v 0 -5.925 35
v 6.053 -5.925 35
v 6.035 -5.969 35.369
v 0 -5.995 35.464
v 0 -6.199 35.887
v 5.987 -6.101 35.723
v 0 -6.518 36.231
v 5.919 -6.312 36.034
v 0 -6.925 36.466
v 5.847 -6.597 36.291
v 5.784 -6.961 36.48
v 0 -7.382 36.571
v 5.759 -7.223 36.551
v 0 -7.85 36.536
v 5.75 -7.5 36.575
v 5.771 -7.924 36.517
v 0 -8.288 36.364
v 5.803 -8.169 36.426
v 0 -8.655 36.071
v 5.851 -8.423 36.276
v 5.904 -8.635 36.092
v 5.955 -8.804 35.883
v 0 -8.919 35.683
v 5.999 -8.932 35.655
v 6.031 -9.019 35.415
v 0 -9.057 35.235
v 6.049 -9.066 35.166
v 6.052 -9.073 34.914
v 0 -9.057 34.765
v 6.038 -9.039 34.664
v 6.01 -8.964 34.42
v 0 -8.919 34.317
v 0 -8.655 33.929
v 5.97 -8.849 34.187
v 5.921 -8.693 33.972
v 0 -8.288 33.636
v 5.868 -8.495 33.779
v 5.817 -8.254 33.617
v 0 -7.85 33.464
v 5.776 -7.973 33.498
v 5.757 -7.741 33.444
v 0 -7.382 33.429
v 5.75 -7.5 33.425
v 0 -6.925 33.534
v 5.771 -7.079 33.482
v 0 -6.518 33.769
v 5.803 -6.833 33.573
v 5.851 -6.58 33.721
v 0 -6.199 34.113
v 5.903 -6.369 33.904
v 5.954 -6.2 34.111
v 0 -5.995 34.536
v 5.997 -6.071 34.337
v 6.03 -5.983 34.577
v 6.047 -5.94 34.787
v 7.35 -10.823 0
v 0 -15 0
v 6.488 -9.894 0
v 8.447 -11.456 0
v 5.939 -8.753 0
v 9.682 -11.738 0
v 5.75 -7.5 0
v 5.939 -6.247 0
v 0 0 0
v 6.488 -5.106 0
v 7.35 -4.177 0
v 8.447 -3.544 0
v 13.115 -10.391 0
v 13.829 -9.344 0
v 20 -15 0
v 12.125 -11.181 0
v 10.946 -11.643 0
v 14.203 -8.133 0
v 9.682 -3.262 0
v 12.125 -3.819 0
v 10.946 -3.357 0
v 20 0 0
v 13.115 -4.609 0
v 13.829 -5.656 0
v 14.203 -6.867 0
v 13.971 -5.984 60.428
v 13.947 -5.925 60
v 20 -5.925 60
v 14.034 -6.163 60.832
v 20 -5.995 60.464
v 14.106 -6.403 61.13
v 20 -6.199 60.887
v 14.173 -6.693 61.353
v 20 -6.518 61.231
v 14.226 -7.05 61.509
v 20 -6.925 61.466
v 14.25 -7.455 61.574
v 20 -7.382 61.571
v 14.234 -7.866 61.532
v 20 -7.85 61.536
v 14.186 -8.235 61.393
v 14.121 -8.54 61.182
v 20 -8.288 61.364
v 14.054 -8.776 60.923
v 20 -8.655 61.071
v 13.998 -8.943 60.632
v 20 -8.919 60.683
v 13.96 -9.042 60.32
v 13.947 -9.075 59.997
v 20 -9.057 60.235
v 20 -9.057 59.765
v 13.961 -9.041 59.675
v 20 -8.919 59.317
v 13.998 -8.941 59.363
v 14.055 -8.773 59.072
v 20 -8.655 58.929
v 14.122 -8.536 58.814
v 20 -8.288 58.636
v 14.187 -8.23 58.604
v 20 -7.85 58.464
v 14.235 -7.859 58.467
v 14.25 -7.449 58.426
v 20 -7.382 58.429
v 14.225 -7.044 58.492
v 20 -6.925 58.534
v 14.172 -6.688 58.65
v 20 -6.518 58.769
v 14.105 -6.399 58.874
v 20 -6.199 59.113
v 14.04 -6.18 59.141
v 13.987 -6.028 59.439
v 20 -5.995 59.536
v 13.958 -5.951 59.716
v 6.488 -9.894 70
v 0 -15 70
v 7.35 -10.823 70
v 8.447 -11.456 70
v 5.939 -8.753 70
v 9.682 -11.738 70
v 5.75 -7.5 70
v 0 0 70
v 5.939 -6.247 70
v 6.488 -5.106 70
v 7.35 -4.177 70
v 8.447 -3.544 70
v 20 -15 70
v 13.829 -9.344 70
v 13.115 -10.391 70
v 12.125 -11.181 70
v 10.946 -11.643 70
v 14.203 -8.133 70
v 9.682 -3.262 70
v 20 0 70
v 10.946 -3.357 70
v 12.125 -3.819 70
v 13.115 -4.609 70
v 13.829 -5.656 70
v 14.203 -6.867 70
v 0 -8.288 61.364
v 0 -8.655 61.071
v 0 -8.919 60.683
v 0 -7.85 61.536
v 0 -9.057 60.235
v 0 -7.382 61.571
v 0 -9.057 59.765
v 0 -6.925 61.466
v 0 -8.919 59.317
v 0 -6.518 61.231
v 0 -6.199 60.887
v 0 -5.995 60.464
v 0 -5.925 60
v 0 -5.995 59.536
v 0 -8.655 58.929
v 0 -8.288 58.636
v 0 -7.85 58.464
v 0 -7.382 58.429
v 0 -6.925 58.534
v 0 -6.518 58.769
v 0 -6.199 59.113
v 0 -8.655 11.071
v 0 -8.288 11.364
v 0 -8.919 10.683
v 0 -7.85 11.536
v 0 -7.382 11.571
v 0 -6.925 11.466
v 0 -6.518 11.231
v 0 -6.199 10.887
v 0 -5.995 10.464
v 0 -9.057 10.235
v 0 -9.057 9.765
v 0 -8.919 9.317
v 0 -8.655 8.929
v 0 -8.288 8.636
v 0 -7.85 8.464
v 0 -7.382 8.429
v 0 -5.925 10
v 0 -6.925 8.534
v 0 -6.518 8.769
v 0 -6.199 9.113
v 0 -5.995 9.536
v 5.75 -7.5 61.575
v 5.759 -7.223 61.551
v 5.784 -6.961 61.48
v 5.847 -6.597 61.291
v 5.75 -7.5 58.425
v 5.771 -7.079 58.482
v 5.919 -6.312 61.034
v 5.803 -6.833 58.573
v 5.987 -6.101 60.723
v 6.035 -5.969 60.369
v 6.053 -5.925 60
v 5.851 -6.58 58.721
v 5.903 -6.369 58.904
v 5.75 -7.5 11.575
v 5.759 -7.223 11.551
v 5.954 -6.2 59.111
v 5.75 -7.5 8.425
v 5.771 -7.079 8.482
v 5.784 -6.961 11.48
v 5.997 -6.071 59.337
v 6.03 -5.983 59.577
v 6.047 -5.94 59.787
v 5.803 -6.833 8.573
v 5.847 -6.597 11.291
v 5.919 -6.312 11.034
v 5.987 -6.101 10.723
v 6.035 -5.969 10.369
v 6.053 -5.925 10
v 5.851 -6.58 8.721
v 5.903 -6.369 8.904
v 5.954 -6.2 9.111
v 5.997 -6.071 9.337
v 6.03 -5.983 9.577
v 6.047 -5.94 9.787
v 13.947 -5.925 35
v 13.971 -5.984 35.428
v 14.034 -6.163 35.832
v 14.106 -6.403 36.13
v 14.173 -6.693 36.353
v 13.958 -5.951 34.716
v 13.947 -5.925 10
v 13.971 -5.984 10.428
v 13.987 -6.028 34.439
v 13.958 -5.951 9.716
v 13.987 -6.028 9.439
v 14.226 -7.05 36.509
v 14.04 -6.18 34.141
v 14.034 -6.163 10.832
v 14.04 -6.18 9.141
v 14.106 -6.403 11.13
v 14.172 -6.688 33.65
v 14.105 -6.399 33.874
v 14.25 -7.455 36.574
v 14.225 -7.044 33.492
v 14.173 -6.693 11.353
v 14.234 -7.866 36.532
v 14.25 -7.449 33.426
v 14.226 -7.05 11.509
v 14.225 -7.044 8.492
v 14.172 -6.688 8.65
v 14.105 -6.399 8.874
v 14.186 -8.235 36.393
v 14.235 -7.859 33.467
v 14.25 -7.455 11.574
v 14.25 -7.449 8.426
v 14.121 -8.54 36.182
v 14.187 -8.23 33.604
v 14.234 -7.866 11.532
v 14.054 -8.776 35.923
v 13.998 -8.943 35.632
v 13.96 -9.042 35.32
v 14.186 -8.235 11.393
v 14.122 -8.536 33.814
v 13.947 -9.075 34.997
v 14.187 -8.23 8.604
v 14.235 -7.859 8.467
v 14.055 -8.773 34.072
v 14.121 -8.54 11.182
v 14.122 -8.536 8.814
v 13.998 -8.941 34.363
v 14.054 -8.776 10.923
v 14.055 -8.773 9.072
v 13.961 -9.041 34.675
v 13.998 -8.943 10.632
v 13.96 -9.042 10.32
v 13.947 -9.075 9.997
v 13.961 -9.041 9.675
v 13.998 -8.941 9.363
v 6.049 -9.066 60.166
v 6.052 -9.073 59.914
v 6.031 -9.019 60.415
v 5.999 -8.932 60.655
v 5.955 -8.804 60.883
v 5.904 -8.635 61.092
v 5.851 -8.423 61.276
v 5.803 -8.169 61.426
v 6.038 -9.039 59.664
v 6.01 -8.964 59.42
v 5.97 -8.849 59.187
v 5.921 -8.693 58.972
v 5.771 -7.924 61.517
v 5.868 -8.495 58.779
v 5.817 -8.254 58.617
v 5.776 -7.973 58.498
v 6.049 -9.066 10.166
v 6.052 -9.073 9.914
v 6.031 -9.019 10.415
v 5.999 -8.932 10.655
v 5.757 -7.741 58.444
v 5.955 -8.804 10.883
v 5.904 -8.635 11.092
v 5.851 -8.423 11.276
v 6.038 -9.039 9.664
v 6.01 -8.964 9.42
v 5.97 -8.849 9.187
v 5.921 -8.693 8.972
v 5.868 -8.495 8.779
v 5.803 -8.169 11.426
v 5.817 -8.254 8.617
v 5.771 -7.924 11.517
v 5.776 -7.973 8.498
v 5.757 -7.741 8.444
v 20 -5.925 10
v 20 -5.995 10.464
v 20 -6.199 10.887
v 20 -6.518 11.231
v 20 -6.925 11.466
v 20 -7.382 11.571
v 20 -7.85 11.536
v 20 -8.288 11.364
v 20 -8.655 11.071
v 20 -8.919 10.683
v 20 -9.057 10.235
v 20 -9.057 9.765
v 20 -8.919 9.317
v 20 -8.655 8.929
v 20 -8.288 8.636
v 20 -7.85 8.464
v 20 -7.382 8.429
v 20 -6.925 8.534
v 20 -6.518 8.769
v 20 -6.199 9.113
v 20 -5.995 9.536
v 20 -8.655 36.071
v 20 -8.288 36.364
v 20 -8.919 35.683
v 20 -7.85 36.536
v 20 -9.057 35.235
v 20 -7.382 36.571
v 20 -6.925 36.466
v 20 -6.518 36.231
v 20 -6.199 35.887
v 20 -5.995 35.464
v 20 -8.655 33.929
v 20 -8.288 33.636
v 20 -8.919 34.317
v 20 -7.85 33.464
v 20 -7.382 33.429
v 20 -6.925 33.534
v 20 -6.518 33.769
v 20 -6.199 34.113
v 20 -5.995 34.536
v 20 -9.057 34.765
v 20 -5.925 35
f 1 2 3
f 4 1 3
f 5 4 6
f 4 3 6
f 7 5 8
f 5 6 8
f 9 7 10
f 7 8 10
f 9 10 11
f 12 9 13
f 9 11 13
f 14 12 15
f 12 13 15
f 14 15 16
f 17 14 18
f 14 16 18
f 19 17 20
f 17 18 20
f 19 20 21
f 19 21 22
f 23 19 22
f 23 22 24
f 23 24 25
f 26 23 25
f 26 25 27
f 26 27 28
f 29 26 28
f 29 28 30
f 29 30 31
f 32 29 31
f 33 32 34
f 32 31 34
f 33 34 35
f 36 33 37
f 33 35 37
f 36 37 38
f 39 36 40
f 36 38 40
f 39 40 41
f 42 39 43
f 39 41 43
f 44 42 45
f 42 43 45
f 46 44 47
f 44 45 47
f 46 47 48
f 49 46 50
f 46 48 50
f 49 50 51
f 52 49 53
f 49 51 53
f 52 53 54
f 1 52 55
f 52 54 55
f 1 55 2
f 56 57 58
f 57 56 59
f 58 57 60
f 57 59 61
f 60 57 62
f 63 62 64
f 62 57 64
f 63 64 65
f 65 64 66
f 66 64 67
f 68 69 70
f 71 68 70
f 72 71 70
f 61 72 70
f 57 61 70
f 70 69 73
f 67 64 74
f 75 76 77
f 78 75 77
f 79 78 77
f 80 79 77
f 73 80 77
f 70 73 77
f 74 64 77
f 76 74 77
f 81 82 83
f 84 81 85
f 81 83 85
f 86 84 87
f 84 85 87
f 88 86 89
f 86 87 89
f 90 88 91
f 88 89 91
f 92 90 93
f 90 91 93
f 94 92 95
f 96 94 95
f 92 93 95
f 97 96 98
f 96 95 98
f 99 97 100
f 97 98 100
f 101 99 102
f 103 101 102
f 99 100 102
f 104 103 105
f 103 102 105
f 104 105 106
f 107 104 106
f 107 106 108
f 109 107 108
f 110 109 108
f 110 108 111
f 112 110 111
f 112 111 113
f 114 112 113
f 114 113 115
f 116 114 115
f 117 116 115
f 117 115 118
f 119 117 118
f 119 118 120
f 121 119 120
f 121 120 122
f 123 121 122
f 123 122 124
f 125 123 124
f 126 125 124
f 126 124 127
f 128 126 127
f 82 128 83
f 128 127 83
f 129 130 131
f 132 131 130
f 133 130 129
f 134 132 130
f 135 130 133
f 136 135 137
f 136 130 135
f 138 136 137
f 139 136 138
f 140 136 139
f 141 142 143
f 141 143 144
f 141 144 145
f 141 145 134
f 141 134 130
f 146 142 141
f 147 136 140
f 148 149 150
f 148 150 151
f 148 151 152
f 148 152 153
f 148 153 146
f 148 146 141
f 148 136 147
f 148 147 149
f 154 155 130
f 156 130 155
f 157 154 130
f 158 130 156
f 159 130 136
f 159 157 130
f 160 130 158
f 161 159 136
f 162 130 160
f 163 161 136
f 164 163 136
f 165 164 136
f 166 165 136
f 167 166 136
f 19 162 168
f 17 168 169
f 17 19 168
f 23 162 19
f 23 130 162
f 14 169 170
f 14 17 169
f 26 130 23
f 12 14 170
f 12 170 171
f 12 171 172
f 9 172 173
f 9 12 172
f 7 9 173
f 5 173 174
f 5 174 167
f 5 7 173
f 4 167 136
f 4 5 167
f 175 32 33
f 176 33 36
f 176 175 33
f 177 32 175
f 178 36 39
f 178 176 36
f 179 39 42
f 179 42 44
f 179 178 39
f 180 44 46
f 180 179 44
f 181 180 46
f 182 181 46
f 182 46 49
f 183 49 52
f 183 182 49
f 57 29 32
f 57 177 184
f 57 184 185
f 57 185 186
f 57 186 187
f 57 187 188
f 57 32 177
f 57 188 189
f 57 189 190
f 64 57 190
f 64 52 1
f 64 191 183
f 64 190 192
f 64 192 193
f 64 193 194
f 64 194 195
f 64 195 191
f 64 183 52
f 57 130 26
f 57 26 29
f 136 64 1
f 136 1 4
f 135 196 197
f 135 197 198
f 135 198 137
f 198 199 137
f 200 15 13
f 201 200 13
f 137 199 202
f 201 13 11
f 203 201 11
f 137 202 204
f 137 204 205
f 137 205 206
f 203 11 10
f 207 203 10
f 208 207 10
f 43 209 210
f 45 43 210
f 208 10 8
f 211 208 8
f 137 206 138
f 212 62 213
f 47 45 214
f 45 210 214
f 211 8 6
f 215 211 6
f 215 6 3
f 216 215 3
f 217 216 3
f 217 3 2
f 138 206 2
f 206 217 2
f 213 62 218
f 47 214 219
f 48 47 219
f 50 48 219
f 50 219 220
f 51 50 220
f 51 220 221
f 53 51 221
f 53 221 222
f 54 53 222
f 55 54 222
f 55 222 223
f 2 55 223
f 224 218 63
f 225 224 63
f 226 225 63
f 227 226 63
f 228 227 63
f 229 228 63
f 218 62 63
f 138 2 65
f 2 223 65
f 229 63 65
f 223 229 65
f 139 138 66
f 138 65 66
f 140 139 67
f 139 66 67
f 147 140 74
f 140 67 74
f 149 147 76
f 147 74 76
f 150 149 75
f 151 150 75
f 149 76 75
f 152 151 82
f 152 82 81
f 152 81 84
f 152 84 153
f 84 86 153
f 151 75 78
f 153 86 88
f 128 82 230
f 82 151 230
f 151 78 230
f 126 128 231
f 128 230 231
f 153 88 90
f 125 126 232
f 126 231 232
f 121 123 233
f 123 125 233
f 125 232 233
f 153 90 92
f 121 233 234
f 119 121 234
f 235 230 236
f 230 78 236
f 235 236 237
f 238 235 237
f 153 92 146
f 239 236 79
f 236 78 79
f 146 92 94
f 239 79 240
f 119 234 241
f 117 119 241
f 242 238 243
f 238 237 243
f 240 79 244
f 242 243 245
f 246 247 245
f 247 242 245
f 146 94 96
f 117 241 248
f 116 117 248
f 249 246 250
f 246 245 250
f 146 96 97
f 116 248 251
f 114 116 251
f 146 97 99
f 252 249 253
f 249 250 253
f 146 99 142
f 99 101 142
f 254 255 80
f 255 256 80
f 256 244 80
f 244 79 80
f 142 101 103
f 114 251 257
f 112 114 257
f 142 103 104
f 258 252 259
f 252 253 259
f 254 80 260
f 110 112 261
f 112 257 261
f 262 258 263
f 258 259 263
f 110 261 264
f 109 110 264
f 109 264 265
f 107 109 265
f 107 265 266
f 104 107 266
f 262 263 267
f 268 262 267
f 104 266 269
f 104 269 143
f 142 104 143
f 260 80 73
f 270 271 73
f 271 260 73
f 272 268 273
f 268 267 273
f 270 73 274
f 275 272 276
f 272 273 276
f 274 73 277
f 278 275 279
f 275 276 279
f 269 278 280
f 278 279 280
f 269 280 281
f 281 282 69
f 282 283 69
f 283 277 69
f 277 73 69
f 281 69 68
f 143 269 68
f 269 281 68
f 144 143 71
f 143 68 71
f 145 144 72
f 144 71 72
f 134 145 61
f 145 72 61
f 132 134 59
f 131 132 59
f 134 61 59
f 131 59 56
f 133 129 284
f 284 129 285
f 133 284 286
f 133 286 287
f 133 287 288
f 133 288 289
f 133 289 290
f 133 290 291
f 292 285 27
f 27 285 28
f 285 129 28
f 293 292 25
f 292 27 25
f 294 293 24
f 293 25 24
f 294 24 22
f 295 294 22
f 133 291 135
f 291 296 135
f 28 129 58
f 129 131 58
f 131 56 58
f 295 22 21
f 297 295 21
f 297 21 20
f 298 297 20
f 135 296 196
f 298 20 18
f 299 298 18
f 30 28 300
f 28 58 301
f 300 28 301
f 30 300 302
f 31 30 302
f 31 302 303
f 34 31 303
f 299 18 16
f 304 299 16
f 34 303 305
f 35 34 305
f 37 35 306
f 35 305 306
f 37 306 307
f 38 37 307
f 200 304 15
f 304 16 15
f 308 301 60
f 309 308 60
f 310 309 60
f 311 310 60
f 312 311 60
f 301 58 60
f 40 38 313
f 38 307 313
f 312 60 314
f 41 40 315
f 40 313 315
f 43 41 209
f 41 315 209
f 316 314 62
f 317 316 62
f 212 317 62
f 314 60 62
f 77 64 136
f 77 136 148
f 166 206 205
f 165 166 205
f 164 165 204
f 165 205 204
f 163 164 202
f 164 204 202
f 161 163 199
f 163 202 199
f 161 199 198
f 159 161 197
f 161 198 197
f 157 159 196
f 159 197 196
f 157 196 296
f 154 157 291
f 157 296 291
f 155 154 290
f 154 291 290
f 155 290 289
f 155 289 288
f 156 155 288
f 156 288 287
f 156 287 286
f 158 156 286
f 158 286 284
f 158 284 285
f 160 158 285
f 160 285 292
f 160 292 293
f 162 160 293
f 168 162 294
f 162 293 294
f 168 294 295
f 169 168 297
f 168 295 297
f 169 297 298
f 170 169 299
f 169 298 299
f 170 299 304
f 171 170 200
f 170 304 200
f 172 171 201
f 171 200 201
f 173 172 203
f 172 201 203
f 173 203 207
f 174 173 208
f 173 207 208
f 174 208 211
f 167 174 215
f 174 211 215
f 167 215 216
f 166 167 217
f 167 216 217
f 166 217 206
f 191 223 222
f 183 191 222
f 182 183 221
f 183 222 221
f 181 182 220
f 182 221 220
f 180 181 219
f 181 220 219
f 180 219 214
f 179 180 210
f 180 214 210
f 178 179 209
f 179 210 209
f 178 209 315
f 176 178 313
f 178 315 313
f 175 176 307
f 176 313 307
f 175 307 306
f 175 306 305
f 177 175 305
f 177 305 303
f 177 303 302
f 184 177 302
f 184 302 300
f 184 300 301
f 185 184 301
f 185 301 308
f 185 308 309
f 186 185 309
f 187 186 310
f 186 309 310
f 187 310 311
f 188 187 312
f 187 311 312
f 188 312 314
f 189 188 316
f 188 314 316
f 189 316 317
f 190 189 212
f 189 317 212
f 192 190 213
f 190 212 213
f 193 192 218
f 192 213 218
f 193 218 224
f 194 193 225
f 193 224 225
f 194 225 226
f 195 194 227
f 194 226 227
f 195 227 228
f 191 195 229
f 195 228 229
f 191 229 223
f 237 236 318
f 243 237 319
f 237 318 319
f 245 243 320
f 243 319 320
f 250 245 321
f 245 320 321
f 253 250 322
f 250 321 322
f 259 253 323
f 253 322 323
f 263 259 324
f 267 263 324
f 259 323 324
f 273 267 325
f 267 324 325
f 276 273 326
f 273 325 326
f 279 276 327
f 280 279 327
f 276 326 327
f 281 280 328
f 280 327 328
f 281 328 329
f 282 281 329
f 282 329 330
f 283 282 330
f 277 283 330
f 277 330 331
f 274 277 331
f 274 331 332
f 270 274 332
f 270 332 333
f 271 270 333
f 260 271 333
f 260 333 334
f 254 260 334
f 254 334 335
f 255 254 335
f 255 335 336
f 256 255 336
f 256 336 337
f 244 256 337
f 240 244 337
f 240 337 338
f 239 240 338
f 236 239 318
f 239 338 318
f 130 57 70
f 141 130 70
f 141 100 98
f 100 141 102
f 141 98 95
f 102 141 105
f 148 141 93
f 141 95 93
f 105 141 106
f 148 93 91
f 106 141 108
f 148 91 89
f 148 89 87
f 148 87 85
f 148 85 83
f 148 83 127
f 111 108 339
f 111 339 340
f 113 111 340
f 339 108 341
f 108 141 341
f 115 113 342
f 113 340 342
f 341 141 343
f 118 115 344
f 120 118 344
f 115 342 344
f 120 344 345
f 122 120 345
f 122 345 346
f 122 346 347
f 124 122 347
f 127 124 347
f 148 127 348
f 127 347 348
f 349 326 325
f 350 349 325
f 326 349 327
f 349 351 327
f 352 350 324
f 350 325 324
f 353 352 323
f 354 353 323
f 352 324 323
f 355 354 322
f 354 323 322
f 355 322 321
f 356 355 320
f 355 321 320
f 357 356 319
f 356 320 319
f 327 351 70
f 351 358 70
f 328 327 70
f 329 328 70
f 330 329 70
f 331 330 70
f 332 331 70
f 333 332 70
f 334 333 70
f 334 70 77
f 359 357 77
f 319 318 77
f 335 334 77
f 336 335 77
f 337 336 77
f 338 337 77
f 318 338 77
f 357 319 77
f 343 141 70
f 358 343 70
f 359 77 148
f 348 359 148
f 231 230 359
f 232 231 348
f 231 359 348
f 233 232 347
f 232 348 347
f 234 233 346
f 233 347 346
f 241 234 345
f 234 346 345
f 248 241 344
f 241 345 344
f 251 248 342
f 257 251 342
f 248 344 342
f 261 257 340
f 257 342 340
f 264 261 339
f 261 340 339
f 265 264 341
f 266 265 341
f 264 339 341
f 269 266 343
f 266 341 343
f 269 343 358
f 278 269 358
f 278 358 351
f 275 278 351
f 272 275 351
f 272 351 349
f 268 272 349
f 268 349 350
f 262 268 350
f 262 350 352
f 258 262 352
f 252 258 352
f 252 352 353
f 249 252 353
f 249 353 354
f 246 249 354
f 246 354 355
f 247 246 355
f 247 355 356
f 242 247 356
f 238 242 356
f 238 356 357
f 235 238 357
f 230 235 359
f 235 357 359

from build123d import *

# Parameters (mm, degrees)
SKETCH_1_W          = 20
SKETCH_1_H          = 15
EXTRUDE_1_DEPTH     = 70
SKETCH_2_R          = 4.25
CUT_EXTRUDE_1_DEPTH = 75.330343737
SKETCH_3_R          = 1.575
CUT_EXTRUDE_2_DEPTH = 75.330343737


with BuildPart() as part:
    # 草图1 → 凸台-拉伸1 (new body)
    with BuildSketch(Plane.XY):
        with Locations((10, -7.5)):
            Rectangle(SKETCH_1_W, SKETCH_1_H)
    extrude(amount=EXTRUDE_1_DEPTH)

    # 草图2 → 切除-拉伸1 (cut, through all)
    with BuildSketch(Plane(origin=(0, 0, 0), x_dir=(-1, 0, 0), z_dir=(0, 0, -1))):
        with Locations((-10, -7.5)):
            Circle(SKETCH_2_R)
    extrude(amount=-CUT_EXTRUDE_1_DEPTH, mode=Mode.SUBTRACT)

    # 草图3 → 切除-拉伸2 (cut, through all)
    with BuildSketch(Plane(origin=(20, 0, 0), x_dir=(0, 0, -1), z_dir=(1, 0, 0))):
        with Locations(Location((-60, -7.5, 0), (0, 0, 90))):
            Circle(SKETCH_3_R)
        with Locations(Location((-35, -7.5, 0), (0, 0, 90))):
            Circle(SKETCH_3_R)
        with Locations(Location((-10, -7.5, 0), (0, 0, 90))):
            Circle(SKETCH_3_R)
    extrude(amount=-CUT_EXTRUDE_2_DEPTH, mode=Mode.SUBTRACT)


solid = part.part
